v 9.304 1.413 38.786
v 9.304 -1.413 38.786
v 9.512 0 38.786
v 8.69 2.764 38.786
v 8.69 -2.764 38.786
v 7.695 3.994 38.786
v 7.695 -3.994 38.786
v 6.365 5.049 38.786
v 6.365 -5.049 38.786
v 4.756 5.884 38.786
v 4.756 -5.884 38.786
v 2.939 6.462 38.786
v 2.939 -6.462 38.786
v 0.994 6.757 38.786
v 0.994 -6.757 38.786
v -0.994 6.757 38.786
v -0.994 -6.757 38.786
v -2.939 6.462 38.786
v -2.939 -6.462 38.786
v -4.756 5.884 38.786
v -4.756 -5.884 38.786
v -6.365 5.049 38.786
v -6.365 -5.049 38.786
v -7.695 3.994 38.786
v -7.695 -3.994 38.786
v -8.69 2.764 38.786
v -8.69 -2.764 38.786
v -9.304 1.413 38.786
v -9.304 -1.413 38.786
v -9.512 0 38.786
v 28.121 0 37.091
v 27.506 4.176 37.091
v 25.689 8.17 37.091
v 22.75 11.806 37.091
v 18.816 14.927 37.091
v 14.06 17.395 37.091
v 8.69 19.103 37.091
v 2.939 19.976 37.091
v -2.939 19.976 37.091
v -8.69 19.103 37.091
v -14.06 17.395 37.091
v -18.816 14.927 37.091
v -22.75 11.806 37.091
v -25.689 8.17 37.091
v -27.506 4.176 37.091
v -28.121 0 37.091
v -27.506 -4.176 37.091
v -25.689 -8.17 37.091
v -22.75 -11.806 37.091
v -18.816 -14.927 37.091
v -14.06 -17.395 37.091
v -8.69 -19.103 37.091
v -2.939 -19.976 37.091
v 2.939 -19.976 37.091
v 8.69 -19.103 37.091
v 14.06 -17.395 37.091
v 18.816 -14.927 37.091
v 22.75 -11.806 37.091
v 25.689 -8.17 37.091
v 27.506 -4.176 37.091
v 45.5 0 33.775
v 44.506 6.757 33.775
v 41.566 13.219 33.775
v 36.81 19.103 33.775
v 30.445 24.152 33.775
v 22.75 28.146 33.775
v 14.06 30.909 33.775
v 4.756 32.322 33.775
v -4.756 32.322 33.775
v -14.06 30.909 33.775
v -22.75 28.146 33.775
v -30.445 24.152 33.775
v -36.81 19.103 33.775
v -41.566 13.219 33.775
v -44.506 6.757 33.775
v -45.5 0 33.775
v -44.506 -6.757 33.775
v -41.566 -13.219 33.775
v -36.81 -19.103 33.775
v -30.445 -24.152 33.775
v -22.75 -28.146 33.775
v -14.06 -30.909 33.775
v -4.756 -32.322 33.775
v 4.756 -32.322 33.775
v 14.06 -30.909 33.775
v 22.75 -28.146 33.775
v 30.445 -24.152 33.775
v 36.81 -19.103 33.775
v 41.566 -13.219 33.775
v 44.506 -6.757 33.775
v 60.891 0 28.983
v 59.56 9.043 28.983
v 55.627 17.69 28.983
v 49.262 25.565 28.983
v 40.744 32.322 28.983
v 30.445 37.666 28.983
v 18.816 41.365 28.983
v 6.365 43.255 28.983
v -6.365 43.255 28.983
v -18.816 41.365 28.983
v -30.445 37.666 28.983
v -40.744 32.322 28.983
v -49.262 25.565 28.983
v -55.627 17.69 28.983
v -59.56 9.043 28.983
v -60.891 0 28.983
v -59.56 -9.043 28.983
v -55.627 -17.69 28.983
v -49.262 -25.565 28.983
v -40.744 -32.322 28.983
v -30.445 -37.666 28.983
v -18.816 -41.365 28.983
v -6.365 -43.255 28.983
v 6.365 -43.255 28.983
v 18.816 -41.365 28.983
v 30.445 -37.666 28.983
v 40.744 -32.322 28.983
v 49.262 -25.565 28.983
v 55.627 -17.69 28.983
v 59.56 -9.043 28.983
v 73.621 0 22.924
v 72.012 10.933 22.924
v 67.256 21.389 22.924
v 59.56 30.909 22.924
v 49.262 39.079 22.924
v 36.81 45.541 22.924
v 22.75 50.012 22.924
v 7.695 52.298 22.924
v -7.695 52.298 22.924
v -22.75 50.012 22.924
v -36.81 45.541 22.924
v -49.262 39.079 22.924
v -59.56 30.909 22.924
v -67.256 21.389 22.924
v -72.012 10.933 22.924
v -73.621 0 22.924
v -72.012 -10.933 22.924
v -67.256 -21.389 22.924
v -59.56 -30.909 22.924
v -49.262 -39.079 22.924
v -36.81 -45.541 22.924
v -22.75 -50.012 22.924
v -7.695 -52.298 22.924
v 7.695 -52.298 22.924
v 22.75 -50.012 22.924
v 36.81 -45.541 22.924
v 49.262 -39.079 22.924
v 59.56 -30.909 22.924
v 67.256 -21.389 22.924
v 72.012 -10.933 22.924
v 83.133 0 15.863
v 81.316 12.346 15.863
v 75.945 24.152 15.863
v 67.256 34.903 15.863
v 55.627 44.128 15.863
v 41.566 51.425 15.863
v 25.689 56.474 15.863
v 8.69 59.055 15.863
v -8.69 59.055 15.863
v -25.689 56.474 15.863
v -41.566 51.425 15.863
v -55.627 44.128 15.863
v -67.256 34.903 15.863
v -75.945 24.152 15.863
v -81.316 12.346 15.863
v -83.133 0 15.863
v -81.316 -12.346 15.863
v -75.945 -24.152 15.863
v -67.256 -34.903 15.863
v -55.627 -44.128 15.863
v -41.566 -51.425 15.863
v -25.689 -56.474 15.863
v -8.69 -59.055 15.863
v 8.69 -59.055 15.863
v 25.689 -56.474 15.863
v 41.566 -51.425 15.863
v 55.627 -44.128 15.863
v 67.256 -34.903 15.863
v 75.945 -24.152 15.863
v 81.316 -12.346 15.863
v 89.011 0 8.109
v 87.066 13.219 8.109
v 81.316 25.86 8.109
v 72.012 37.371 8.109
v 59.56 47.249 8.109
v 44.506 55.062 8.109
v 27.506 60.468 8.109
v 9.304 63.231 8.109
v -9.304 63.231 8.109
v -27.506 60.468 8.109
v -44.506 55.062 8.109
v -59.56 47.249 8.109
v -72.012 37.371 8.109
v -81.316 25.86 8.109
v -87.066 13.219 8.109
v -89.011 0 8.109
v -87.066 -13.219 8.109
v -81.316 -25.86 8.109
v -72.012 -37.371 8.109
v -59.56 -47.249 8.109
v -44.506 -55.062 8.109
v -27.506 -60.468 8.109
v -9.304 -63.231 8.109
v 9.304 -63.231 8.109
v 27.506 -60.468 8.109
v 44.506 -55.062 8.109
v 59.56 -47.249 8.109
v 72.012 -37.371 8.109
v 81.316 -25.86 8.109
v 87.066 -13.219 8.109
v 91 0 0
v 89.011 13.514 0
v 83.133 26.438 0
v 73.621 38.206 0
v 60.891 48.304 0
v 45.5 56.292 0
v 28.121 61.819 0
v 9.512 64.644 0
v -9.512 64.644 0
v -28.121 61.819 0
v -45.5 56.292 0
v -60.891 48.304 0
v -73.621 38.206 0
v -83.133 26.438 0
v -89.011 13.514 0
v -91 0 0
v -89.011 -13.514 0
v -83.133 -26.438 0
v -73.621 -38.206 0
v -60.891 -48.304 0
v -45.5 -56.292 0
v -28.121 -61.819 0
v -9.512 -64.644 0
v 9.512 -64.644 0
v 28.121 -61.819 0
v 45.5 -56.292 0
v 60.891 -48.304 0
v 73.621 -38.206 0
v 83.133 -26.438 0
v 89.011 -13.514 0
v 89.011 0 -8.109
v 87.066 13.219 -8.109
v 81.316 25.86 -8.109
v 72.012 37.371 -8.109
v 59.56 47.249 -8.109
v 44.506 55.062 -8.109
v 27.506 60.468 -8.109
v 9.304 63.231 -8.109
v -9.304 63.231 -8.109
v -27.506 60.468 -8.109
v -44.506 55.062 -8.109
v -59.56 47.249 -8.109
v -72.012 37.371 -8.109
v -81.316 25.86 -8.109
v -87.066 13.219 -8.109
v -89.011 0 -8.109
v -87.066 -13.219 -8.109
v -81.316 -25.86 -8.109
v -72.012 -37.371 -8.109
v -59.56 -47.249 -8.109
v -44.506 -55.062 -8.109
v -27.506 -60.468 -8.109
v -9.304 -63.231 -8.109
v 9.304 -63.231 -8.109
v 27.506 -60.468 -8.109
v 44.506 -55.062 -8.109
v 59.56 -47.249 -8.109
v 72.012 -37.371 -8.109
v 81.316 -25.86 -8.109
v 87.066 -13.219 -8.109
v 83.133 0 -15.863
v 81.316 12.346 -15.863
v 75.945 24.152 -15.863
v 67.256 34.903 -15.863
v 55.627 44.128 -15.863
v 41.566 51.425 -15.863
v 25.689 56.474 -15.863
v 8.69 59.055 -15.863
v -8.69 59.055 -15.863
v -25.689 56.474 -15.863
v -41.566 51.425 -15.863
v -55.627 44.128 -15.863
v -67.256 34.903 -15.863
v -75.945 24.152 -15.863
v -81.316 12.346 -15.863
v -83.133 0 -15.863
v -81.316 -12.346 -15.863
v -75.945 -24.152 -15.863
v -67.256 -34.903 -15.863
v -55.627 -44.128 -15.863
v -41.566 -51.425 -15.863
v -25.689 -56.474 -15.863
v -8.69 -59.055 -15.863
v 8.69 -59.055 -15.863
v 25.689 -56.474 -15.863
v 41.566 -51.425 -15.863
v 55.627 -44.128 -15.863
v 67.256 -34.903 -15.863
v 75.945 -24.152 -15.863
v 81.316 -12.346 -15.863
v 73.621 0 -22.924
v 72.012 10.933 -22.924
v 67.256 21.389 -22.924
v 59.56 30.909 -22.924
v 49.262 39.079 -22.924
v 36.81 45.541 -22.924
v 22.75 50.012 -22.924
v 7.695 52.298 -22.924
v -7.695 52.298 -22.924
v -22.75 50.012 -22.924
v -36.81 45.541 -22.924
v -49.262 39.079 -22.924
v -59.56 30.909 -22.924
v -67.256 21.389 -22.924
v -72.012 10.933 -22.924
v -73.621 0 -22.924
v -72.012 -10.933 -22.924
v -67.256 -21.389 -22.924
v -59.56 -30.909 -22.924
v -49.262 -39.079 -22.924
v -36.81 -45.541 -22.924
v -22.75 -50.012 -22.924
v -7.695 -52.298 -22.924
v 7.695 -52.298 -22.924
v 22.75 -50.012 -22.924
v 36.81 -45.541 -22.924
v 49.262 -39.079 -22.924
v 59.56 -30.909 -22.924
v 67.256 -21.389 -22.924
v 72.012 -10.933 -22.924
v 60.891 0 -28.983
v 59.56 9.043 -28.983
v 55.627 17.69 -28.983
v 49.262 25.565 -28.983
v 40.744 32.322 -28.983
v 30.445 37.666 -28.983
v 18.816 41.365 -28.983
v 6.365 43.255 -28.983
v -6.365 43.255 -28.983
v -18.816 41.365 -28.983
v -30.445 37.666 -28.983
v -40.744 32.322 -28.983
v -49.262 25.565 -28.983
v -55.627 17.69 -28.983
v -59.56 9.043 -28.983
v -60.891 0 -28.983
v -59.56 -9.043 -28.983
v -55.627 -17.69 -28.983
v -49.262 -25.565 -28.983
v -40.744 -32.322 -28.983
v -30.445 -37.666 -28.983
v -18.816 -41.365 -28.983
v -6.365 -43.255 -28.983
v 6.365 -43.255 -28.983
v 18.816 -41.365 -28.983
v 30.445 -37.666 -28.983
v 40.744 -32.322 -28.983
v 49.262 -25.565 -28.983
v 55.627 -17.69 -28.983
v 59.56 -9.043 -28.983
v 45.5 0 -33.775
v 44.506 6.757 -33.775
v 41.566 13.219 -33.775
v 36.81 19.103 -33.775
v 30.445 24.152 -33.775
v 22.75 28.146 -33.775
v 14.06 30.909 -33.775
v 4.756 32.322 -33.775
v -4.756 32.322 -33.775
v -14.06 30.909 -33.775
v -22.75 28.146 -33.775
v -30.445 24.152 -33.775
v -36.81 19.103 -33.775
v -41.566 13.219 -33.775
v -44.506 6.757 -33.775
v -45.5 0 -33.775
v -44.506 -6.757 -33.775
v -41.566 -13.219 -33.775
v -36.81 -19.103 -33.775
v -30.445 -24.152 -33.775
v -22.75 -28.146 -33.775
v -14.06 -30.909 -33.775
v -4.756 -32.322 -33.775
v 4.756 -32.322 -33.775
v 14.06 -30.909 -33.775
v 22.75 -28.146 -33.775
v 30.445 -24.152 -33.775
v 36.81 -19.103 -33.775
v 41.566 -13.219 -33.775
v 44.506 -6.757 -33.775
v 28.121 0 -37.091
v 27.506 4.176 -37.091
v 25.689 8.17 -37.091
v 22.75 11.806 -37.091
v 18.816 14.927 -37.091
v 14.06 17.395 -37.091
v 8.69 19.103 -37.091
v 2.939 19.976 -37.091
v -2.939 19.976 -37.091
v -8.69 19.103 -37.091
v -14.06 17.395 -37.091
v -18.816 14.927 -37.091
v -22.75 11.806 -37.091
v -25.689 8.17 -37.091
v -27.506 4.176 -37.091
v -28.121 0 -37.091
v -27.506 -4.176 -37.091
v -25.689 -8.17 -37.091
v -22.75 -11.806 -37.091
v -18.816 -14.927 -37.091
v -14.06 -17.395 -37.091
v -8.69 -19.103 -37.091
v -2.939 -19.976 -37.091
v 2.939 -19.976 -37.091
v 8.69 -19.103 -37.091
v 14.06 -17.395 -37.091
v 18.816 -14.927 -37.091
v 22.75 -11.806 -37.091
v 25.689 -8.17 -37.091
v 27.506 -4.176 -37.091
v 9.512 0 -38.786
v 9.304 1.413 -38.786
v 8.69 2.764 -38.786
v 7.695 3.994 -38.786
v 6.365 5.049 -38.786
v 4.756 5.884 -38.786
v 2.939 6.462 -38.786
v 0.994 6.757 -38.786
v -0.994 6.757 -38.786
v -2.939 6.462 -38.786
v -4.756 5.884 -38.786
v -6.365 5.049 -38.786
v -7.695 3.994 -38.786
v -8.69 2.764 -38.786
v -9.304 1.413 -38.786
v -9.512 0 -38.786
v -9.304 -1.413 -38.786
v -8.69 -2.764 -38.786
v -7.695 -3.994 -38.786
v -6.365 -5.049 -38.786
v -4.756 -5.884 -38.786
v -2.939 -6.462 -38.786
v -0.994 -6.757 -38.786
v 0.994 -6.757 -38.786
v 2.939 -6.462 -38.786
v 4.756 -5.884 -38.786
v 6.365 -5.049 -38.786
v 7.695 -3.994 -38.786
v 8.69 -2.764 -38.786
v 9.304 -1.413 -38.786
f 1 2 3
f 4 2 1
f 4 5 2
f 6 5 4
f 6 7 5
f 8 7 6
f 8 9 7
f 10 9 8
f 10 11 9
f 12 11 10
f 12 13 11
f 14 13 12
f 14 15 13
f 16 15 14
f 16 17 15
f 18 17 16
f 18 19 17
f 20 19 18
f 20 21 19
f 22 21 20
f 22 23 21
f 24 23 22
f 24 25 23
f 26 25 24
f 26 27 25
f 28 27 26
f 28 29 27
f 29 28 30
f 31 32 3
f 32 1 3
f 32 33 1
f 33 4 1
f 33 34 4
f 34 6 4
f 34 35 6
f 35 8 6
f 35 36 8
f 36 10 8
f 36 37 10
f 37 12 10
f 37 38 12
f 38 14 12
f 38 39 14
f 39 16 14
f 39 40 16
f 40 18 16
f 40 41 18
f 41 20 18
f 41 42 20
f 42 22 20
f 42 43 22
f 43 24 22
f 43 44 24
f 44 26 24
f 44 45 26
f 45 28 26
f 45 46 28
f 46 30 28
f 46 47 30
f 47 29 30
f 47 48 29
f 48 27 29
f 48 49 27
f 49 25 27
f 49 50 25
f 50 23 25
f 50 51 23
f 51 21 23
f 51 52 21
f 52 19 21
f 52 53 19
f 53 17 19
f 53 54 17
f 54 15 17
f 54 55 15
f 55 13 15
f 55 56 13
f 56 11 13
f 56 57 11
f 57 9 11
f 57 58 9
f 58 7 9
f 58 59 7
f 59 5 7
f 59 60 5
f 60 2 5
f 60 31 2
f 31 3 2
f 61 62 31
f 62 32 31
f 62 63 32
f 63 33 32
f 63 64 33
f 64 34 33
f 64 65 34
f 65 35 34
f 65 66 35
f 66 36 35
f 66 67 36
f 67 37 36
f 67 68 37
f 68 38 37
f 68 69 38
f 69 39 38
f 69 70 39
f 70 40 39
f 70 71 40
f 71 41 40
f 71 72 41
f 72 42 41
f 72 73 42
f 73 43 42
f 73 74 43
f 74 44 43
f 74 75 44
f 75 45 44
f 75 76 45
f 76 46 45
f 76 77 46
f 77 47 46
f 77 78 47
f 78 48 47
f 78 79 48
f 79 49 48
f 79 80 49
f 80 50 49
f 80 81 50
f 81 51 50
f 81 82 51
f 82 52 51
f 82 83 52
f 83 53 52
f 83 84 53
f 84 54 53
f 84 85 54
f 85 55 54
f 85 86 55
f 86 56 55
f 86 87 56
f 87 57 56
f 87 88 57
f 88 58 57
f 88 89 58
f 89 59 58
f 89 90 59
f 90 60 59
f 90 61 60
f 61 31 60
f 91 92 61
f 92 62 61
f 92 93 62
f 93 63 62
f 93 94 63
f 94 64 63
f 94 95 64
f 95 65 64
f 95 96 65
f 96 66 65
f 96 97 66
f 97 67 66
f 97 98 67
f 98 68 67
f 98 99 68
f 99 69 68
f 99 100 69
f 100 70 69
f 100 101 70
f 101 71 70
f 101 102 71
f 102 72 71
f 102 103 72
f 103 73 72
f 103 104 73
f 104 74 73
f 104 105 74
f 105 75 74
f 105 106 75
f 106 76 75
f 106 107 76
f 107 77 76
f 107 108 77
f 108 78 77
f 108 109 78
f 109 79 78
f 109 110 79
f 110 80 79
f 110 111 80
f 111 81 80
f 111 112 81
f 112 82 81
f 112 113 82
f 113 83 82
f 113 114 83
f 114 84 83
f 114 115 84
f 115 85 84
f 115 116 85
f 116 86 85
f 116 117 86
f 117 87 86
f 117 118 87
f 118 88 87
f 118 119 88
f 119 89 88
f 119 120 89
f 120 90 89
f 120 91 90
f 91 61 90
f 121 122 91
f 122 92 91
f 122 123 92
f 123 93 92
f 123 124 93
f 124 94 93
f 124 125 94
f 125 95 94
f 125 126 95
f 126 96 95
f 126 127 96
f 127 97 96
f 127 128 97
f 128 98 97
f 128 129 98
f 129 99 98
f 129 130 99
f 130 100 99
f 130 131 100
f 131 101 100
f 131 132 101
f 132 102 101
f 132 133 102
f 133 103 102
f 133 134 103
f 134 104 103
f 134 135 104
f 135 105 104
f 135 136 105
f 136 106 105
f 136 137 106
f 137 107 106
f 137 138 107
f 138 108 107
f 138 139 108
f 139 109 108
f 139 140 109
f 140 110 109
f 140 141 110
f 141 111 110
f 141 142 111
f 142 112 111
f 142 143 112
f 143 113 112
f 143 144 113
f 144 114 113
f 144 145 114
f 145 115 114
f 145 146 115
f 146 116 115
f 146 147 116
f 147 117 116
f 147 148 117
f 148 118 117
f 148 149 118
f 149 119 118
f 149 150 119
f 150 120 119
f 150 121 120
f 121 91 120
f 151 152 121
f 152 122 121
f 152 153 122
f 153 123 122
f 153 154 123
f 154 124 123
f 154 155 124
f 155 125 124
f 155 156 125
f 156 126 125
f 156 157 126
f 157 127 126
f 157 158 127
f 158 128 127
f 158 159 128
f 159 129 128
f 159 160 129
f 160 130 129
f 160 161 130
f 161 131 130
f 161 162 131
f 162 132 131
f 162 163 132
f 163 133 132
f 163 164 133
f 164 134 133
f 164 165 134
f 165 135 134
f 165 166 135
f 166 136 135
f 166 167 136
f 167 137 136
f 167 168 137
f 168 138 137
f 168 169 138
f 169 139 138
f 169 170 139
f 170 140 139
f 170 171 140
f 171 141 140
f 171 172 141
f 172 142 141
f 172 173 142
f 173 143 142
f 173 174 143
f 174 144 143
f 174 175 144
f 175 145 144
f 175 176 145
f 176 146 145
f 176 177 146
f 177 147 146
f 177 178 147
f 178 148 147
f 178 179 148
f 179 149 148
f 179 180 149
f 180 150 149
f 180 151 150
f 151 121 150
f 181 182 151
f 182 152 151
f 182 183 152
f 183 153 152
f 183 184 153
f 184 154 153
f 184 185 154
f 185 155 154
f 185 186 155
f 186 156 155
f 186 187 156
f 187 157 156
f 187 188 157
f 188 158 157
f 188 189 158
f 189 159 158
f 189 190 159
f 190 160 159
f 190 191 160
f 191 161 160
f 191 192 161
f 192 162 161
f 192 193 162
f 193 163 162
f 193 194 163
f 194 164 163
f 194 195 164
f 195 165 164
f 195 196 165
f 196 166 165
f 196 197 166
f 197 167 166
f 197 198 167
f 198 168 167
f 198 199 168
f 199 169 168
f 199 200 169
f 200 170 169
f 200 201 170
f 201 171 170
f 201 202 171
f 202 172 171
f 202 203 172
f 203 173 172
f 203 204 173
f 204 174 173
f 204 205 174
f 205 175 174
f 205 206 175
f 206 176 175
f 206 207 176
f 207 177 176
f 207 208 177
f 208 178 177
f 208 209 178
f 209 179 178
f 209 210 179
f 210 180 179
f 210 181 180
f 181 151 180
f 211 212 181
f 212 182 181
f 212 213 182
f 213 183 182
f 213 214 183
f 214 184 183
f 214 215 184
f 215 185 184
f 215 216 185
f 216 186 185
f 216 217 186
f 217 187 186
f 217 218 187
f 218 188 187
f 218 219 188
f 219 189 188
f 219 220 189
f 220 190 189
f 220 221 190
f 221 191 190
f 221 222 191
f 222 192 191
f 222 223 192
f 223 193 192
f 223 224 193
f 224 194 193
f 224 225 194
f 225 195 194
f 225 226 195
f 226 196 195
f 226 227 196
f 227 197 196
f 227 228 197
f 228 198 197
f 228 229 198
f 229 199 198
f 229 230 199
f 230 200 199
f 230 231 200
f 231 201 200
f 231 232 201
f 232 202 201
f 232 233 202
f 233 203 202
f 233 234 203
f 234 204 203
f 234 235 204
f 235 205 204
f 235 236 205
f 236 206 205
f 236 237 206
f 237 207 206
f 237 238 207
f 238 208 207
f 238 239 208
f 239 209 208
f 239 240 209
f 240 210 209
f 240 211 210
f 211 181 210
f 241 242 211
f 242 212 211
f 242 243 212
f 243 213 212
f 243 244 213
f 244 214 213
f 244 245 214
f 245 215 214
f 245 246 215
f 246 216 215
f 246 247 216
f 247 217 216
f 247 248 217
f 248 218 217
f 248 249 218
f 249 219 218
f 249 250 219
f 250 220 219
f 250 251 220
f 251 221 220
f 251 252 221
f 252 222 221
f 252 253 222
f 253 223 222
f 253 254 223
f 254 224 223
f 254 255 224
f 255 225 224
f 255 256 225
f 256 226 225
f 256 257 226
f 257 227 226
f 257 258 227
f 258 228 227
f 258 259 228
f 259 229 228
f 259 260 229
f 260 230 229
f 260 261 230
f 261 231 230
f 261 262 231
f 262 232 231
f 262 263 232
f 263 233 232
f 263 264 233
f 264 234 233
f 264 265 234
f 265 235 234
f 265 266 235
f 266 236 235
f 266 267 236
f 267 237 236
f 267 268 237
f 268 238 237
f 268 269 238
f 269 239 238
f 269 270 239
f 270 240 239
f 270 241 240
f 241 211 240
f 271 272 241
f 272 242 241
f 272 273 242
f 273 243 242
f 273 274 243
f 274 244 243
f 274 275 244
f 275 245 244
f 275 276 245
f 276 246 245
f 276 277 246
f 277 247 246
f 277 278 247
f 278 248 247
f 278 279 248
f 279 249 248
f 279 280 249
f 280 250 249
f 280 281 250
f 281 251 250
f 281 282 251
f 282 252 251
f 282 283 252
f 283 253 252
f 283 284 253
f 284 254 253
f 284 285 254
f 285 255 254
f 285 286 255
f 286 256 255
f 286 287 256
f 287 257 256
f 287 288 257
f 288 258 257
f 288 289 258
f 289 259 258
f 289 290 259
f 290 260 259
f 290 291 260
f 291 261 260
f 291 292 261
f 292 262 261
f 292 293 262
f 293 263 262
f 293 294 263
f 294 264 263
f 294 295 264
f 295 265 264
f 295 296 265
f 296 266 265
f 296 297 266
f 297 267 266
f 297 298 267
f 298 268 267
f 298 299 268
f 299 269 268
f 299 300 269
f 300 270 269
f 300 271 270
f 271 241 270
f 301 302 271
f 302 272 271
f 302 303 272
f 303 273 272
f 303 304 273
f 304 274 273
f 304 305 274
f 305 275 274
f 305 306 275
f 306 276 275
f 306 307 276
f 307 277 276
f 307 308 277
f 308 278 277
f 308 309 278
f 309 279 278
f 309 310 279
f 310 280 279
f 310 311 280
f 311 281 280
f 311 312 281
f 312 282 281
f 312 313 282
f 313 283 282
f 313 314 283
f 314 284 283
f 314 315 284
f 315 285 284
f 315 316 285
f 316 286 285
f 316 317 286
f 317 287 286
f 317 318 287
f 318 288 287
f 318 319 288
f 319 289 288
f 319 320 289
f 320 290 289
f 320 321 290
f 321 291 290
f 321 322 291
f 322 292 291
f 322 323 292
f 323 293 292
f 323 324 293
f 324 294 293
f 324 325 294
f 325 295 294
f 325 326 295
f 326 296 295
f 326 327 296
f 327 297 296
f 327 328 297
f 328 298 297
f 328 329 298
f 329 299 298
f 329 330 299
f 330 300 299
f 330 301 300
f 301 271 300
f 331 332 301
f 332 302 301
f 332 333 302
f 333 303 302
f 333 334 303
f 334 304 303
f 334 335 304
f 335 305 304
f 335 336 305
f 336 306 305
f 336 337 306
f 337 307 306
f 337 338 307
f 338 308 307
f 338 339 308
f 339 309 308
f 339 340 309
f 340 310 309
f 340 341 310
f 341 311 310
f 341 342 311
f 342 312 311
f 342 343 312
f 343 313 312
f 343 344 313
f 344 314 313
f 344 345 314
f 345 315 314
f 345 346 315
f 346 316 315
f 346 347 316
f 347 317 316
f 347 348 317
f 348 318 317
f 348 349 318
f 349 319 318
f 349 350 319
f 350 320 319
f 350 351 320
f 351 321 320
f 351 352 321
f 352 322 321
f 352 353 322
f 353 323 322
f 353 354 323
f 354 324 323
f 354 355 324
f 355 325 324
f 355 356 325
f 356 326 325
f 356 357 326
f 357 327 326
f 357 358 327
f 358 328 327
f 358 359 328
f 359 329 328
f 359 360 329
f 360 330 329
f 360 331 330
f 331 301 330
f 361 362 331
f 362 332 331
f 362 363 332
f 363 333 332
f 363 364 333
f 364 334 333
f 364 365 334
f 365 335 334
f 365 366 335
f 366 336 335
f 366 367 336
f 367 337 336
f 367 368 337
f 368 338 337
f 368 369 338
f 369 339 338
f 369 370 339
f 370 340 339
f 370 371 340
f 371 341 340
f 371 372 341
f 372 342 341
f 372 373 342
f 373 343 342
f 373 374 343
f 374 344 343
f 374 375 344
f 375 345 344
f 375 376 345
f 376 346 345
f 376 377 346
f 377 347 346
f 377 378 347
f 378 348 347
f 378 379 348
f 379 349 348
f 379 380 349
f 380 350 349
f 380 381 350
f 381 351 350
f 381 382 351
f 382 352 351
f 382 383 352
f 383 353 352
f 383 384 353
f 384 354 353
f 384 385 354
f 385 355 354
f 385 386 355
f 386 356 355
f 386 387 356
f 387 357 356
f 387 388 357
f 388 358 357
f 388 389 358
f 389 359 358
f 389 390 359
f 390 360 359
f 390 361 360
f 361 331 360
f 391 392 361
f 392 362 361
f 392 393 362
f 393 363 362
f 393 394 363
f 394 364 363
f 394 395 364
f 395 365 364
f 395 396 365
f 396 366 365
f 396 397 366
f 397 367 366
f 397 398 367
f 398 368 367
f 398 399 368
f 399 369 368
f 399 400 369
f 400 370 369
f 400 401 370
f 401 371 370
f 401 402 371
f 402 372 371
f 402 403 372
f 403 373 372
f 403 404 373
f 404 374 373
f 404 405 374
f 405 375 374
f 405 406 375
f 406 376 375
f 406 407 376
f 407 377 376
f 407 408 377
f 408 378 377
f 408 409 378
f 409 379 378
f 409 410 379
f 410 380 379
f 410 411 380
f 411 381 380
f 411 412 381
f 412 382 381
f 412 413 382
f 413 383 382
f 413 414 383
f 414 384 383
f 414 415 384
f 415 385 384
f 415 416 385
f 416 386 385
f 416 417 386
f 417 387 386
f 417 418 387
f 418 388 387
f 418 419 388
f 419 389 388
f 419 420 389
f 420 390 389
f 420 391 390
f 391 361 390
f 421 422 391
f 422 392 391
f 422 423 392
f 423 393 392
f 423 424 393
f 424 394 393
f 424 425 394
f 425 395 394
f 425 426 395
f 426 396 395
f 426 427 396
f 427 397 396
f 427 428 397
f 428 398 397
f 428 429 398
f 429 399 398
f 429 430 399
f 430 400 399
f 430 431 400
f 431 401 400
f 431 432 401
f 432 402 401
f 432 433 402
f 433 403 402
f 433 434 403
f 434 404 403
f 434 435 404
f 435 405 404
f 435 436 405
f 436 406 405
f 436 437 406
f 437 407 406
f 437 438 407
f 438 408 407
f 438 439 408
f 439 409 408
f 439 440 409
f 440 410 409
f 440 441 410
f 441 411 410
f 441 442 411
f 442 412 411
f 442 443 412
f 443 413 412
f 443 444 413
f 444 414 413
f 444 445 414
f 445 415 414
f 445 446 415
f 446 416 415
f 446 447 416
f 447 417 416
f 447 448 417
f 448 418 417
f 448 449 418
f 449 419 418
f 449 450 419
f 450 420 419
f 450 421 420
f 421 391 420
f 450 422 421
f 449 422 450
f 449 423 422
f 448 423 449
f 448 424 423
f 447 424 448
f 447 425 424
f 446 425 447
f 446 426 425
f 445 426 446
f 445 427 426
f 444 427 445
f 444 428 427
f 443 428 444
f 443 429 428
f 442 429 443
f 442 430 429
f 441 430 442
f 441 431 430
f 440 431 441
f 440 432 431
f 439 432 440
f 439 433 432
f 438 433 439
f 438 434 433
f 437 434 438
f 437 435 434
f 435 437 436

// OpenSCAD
// Generated by SolidPython 1.0.1 on 2020-07-29 00:46:47


scale(v = [7, 5, 3]) {
	sphere(r = 13);
}
/***********************************************
*********      SolidPython code:      **********
************************************************
 
# import packages: SolidPython
from solid import *
from solid.utils import *
from itertools import chain, combinations, permutations


class Resize:

    def __init__(self, scad_file):
        self.scad_file = scad_file
        #self.scad_file = import_scad(scad_file)
        # cone/cylinder param:
        self.r1 = 0
        self.r2 = 0
        self.h = 0
        # rectangular prism param:
        self.w = 0
        self.l = 0
        # ellipse param:
        self.r = 0

    # import OpenScad code (file name corresponds to shape)


    # classify shape + parameters
    def assign(self, param1, param2, param3):
        if self.scad_file == 'cone.scad':
            self.r1 = param1
            self.r2 = param2
            self.h = param3
        elif self.scad_file == 'cylinder.scad':
            self.r1 = param1
            self.r2 = param2
            self.h = param3
        elif self.scad_file == 'rectangularPrism.scad':
            self.h = param1
            self.l = param2
            self.w = param3
        else:
            self.r = param1
            self.h = param2

    # resize parameters
    def iterate(self):
        x = range(3, 20, 2)
        i = 1
        if self.scad_file == 'cone.scad':
            tempList = list(permutations(x, 2))
            for temp in tempList:
                param1 = temp[0]
                param2 = temp[1]
                filepath = 'produced_scad_files/' + 'cone' + str(param1) + '_' + str(param2) + '_' + '.scad'
                scad_render_to_file(cylinder(h=param1, r1=param2, r2=0), filepath)

        elif self.scad_file == 'cylinder.scad':
            tempList = list(permutations(x, 3))
            for temp in tempList:
                param1 = temp[0]
                param2 = temp[1]
                filepath = 'produced_scad_files/' + 'cylinder' + str(param1) + '_' + str(param2) + '_' + '.scad'
                scad_render_to_file(cylinder(h=param1, r1=param2, r2=param2), filepath)

        elif self.scad_file == 'rectangularPrism.scad':
            tempList = list(permutations(x, 3))
            for temp in tempList:
                param1 = temp[0]
                param2 = temp[1]
                param3 = temp[2]
                filepath = 'produced_scad_files/' + 'rectangularPrism' + str(param1) + '_' + str(param2) + '_' + str(
                    param3) + '.scad'
                scad_render_to_file(cube(size=(param1, param2, param3)), filepath)

        elif self.scad_file == 'ellipse.scad':
            tempList = list(permutations(x, 4))
            for temp in tempList:
                param1 = temp[0]
                param2 = temp[1]
                param3 = temp[2]
                param4 = temp[3]
                filepath = 'produced_scad_files/' + 'ellipse' + str(param1) + '_' + str(param2) + '_' + str(param3) + '_' + str(param4) + '.scad'
                scad_render_to_file(scale([param1, param2, param3])(sphere(r=param4)), filepath)

    def render_to_scadfile(self):
        scad_render_to_file(scad, 'example.scad') 
 
************************************************/
